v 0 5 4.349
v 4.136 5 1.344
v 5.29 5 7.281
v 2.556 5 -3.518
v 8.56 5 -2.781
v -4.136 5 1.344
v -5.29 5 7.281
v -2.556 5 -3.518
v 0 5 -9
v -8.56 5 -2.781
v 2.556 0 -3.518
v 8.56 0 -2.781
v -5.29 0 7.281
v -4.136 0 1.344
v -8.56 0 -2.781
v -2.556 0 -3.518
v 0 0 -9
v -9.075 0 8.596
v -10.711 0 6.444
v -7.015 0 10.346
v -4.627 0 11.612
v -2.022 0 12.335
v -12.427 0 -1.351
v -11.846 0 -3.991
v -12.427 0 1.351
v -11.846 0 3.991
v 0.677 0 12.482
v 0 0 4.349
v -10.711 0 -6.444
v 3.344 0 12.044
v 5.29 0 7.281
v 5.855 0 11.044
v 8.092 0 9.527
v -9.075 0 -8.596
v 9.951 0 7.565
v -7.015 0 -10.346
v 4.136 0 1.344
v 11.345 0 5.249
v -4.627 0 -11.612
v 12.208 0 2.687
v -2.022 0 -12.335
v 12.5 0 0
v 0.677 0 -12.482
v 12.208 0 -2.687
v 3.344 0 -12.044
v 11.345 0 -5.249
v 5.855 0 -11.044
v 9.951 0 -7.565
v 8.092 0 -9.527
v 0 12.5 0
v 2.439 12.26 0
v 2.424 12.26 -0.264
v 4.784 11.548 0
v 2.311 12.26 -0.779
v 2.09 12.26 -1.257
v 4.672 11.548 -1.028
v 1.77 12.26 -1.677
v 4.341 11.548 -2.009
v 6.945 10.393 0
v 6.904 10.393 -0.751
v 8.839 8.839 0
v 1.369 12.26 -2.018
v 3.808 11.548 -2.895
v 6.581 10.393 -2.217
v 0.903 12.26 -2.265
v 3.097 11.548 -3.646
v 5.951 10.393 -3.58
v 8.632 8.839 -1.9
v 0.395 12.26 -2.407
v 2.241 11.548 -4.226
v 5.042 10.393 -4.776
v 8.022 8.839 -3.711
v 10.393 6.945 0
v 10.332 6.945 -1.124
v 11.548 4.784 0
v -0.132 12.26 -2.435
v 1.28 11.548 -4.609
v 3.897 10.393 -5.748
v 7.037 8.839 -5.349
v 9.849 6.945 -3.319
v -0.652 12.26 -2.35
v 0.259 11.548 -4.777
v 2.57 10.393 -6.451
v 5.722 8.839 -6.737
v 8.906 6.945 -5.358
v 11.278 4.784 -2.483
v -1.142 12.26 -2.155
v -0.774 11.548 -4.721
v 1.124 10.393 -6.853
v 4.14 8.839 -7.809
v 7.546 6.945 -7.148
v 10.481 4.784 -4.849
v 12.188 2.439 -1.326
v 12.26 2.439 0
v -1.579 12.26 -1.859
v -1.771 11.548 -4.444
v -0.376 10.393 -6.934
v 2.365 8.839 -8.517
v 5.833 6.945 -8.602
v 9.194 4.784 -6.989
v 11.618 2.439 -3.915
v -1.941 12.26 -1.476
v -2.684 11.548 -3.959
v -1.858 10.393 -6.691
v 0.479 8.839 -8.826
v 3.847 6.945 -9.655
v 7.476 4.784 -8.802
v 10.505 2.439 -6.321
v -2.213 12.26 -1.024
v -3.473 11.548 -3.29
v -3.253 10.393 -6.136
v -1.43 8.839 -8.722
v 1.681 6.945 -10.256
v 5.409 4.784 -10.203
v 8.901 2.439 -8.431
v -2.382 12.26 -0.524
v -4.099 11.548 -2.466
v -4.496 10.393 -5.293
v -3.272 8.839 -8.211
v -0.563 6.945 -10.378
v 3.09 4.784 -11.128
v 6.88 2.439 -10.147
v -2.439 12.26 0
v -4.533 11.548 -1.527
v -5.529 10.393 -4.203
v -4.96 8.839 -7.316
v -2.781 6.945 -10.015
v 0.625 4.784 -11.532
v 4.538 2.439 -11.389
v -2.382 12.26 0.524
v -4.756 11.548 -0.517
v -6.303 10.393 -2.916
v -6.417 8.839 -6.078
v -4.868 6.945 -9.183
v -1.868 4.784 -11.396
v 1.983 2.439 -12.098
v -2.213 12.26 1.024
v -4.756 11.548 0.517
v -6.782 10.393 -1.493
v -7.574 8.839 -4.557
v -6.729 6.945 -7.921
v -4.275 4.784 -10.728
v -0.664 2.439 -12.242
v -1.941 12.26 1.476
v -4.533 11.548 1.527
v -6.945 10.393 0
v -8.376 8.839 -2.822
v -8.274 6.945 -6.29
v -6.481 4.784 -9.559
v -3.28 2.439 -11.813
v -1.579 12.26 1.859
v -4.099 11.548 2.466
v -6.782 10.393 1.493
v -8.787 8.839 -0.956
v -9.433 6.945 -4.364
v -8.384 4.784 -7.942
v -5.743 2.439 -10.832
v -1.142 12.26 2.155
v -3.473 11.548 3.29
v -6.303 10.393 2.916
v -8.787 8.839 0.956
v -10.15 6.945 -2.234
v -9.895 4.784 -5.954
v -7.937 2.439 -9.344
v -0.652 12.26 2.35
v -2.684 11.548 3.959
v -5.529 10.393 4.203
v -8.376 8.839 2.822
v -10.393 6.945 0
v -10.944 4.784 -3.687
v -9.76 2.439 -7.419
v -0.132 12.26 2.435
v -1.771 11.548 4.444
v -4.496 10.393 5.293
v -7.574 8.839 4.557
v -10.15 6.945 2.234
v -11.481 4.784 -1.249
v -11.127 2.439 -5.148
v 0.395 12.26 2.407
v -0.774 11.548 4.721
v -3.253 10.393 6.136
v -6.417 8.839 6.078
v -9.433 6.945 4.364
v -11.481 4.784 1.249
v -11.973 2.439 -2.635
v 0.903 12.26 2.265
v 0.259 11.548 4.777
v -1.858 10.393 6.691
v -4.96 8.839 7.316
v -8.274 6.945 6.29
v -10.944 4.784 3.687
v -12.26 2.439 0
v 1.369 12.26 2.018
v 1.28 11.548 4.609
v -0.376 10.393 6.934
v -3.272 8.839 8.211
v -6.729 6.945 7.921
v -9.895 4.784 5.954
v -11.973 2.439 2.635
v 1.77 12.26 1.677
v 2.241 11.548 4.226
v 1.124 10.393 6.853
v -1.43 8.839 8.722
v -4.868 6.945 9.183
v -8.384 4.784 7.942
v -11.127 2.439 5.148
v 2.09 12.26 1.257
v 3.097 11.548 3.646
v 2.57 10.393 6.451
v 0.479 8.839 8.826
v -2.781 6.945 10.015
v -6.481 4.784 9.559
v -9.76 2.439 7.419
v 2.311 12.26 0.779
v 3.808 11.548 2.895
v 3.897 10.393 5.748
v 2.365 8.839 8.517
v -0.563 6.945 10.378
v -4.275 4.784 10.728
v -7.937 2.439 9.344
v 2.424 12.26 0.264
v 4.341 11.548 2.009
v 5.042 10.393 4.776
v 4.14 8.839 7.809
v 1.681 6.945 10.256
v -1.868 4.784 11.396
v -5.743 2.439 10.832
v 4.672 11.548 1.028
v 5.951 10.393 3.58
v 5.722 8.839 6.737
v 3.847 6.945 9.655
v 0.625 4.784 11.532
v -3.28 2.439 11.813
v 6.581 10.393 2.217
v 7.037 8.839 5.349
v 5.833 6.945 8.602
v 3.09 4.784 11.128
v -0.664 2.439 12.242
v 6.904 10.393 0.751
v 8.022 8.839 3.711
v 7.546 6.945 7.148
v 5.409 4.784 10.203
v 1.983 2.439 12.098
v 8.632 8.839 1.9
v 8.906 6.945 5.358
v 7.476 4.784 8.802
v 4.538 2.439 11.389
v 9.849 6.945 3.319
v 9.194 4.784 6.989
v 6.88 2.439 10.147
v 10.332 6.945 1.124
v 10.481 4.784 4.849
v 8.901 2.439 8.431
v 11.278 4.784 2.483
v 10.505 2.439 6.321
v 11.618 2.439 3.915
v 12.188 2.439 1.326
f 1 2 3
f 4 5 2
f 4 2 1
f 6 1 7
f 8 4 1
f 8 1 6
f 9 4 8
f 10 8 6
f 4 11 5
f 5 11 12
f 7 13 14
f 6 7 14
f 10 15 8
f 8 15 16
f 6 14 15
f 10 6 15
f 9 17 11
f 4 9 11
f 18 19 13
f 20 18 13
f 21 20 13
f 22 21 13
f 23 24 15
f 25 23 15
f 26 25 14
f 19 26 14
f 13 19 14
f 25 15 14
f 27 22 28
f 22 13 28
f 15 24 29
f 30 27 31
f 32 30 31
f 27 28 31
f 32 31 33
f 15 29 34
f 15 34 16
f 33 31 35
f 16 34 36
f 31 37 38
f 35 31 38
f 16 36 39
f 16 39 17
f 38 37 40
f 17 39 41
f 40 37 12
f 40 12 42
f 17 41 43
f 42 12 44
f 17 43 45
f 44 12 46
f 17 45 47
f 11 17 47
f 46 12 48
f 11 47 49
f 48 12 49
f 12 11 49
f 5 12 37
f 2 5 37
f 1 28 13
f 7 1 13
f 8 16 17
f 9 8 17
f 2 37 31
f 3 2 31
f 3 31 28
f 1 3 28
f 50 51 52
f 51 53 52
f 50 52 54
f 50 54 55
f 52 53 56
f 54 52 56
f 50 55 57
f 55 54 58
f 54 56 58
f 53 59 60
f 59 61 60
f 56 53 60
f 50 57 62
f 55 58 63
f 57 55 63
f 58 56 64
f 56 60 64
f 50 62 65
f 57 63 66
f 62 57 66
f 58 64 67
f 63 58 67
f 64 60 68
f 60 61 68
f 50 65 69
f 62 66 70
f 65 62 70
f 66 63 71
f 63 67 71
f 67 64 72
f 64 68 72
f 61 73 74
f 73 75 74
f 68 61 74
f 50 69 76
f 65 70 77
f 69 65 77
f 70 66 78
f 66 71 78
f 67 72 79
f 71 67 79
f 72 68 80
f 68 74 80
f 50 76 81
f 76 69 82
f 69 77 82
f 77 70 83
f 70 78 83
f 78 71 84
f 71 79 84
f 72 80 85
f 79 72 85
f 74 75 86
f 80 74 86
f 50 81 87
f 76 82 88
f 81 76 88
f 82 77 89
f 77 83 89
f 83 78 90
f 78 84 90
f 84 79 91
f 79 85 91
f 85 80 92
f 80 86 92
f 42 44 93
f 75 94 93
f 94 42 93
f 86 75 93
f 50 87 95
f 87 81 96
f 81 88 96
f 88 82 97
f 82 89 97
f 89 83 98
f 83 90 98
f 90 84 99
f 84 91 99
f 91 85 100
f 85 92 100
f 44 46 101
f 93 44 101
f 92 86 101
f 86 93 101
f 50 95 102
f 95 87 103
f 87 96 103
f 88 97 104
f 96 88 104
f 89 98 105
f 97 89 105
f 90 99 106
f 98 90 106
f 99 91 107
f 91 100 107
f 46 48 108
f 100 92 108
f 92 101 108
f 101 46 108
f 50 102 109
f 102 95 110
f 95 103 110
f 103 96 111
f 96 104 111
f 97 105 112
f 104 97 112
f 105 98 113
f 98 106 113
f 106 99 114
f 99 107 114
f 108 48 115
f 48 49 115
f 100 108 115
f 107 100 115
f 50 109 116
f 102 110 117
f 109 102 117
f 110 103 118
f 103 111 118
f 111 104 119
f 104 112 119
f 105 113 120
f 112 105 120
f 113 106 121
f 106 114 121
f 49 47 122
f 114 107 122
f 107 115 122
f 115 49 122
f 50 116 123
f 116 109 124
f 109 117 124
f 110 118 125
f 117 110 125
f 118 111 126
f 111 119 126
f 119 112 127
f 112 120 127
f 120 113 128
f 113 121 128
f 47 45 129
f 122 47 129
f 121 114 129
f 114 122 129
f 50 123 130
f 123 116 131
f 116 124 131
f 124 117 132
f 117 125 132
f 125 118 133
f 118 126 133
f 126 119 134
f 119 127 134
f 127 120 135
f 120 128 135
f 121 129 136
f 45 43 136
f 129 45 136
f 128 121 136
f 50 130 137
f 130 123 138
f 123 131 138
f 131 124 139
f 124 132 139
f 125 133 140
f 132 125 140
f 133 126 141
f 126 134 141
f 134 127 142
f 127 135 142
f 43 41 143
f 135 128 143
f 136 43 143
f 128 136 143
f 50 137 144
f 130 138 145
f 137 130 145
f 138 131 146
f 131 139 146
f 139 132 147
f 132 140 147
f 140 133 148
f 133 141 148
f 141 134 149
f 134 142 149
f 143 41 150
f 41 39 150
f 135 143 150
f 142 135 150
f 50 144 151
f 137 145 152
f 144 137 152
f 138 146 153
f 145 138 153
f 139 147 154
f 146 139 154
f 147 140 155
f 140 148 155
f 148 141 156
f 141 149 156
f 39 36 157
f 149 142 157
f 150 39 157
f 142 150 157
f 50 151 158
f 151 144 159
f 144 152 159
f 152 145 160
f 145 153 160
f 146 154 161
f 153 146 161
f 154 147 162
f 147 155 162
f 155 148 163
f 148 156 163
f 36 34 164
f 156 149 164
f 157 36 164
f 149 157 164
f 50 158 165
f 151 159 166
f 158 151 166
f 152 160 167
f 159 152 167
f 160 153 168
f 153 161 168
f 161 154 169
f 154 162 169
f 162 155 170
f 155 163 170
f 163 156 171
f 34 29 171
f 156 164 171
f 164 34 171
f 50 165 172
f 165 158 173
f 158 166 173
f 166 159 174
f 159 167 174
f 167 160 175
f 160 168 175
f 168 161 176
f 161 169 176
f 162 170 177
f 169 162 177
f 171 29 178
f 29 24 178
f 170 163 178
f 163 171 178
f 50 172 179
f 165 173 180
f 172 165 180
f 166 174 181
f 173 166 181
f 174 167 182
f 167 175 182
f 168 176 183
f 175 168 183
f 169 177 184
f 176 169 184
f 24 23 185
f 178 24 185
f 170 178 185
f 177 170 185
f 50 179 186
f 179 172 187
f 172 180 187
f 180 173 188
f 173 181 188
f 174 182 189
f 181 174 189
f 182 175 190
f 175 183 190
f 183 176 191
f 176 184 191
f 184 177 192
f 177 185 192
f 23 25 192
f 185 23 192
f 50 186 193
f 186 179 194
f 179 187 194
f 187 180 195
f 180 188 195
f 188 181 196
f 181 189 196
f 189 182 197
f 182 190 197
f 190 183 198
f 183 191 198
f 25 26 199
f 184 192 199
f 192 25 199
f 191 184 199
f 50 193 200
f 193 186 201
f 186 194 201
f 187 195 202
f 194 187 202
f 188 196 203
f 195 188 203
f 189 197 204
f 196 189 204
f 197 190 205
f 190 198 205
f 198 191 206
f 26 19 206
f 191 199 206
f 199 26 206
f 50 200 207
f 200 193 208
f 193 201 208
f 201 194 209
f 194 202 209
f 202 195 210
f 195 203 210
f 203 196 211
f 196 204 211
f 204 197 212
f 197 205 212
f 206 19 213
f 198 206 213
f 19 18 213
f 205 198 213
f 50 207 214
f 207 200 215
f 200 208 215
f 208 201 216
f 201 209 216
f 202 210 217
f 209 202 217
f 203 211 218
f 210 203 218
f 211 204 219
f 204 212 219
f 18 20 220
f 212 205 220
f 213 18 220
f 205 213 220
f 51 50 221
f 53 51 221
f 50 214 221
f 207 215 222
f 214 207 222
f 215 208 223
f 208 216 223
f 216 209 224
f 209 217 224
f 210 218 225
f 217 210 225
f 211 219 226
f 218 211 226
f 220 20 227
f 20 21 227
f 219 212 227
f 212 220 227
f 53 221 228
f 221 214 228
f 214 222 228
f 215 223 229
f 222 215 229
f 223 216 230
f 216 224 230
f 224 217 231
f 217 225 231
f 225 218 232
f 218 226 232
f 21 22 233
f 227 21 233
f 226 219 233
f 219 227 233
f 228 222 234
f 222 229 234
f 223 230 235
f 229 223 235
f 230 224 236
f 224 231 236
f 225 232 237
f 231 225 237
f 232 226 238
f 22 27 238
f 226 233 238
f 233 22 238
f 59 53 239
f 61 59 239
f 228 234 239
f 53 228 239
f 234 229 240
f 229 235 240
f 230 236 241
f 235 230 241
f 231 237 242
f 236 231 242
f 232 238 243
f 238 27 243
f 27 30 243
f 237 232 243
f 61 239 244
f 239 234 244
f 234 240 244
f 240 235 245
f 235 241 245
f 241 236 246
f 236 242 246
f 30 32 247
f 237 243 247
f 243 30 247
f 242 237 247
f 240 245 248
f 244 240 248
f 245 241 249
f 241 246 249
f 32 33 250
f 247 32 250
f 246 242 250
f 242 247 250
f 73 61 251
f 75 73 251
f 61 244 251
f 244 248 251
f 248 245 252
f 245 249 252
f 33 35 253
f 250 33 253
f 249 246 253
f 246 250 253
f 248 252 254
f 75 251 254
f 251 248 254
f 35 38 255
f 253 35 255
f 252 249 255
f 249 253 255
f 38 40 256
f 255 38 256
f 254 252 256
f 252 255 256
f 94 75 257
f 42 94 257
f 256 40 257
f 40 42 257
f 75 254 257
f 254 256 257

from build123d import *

# Parameters (mm, degrees)
CUT_EXTRUDE1_DEPTH = 5


with BuildPart() as part:
    # Sketch1 → Revolve1 (revolve)
    with BuildSketch(Plane.XY):
        with BuildLine():
            Line((12.5, 0), (0, 0))
            Line((0, 0), (0, 12.5))
            ThreePointArc((0, 12.5), (8.838834765, 8.838834765), (12.5, 0))
        make_face()
    revolve(axis=Axis((0, 0, 0), (0, 1, 0)))

    # Sketch2 → Cut-Extrude1 (cut)
    with BuildSketch(Plane(origin=(0, 0, 0), x_dir=(1, 0, 0), z_dir=(0, 1, 0))):
        Polygon((0, 9), (2.556172718, 3.518269915), (8.559508647, 2.781152949), (4.13597434, -1.343859526), (5.290067271, -7.281152949), (0, -4.348820778), (-5.290067271, -7.281152949), (-4.13597434, -1.343859526), (-8.559508647, 2.781152949), (-2.556172718, 3.518269915), align=None)
    extrude(amount=CUT_EXTRUDE1_DEPTH, mode=Mode.SUBTRACT)


solid = part.part
